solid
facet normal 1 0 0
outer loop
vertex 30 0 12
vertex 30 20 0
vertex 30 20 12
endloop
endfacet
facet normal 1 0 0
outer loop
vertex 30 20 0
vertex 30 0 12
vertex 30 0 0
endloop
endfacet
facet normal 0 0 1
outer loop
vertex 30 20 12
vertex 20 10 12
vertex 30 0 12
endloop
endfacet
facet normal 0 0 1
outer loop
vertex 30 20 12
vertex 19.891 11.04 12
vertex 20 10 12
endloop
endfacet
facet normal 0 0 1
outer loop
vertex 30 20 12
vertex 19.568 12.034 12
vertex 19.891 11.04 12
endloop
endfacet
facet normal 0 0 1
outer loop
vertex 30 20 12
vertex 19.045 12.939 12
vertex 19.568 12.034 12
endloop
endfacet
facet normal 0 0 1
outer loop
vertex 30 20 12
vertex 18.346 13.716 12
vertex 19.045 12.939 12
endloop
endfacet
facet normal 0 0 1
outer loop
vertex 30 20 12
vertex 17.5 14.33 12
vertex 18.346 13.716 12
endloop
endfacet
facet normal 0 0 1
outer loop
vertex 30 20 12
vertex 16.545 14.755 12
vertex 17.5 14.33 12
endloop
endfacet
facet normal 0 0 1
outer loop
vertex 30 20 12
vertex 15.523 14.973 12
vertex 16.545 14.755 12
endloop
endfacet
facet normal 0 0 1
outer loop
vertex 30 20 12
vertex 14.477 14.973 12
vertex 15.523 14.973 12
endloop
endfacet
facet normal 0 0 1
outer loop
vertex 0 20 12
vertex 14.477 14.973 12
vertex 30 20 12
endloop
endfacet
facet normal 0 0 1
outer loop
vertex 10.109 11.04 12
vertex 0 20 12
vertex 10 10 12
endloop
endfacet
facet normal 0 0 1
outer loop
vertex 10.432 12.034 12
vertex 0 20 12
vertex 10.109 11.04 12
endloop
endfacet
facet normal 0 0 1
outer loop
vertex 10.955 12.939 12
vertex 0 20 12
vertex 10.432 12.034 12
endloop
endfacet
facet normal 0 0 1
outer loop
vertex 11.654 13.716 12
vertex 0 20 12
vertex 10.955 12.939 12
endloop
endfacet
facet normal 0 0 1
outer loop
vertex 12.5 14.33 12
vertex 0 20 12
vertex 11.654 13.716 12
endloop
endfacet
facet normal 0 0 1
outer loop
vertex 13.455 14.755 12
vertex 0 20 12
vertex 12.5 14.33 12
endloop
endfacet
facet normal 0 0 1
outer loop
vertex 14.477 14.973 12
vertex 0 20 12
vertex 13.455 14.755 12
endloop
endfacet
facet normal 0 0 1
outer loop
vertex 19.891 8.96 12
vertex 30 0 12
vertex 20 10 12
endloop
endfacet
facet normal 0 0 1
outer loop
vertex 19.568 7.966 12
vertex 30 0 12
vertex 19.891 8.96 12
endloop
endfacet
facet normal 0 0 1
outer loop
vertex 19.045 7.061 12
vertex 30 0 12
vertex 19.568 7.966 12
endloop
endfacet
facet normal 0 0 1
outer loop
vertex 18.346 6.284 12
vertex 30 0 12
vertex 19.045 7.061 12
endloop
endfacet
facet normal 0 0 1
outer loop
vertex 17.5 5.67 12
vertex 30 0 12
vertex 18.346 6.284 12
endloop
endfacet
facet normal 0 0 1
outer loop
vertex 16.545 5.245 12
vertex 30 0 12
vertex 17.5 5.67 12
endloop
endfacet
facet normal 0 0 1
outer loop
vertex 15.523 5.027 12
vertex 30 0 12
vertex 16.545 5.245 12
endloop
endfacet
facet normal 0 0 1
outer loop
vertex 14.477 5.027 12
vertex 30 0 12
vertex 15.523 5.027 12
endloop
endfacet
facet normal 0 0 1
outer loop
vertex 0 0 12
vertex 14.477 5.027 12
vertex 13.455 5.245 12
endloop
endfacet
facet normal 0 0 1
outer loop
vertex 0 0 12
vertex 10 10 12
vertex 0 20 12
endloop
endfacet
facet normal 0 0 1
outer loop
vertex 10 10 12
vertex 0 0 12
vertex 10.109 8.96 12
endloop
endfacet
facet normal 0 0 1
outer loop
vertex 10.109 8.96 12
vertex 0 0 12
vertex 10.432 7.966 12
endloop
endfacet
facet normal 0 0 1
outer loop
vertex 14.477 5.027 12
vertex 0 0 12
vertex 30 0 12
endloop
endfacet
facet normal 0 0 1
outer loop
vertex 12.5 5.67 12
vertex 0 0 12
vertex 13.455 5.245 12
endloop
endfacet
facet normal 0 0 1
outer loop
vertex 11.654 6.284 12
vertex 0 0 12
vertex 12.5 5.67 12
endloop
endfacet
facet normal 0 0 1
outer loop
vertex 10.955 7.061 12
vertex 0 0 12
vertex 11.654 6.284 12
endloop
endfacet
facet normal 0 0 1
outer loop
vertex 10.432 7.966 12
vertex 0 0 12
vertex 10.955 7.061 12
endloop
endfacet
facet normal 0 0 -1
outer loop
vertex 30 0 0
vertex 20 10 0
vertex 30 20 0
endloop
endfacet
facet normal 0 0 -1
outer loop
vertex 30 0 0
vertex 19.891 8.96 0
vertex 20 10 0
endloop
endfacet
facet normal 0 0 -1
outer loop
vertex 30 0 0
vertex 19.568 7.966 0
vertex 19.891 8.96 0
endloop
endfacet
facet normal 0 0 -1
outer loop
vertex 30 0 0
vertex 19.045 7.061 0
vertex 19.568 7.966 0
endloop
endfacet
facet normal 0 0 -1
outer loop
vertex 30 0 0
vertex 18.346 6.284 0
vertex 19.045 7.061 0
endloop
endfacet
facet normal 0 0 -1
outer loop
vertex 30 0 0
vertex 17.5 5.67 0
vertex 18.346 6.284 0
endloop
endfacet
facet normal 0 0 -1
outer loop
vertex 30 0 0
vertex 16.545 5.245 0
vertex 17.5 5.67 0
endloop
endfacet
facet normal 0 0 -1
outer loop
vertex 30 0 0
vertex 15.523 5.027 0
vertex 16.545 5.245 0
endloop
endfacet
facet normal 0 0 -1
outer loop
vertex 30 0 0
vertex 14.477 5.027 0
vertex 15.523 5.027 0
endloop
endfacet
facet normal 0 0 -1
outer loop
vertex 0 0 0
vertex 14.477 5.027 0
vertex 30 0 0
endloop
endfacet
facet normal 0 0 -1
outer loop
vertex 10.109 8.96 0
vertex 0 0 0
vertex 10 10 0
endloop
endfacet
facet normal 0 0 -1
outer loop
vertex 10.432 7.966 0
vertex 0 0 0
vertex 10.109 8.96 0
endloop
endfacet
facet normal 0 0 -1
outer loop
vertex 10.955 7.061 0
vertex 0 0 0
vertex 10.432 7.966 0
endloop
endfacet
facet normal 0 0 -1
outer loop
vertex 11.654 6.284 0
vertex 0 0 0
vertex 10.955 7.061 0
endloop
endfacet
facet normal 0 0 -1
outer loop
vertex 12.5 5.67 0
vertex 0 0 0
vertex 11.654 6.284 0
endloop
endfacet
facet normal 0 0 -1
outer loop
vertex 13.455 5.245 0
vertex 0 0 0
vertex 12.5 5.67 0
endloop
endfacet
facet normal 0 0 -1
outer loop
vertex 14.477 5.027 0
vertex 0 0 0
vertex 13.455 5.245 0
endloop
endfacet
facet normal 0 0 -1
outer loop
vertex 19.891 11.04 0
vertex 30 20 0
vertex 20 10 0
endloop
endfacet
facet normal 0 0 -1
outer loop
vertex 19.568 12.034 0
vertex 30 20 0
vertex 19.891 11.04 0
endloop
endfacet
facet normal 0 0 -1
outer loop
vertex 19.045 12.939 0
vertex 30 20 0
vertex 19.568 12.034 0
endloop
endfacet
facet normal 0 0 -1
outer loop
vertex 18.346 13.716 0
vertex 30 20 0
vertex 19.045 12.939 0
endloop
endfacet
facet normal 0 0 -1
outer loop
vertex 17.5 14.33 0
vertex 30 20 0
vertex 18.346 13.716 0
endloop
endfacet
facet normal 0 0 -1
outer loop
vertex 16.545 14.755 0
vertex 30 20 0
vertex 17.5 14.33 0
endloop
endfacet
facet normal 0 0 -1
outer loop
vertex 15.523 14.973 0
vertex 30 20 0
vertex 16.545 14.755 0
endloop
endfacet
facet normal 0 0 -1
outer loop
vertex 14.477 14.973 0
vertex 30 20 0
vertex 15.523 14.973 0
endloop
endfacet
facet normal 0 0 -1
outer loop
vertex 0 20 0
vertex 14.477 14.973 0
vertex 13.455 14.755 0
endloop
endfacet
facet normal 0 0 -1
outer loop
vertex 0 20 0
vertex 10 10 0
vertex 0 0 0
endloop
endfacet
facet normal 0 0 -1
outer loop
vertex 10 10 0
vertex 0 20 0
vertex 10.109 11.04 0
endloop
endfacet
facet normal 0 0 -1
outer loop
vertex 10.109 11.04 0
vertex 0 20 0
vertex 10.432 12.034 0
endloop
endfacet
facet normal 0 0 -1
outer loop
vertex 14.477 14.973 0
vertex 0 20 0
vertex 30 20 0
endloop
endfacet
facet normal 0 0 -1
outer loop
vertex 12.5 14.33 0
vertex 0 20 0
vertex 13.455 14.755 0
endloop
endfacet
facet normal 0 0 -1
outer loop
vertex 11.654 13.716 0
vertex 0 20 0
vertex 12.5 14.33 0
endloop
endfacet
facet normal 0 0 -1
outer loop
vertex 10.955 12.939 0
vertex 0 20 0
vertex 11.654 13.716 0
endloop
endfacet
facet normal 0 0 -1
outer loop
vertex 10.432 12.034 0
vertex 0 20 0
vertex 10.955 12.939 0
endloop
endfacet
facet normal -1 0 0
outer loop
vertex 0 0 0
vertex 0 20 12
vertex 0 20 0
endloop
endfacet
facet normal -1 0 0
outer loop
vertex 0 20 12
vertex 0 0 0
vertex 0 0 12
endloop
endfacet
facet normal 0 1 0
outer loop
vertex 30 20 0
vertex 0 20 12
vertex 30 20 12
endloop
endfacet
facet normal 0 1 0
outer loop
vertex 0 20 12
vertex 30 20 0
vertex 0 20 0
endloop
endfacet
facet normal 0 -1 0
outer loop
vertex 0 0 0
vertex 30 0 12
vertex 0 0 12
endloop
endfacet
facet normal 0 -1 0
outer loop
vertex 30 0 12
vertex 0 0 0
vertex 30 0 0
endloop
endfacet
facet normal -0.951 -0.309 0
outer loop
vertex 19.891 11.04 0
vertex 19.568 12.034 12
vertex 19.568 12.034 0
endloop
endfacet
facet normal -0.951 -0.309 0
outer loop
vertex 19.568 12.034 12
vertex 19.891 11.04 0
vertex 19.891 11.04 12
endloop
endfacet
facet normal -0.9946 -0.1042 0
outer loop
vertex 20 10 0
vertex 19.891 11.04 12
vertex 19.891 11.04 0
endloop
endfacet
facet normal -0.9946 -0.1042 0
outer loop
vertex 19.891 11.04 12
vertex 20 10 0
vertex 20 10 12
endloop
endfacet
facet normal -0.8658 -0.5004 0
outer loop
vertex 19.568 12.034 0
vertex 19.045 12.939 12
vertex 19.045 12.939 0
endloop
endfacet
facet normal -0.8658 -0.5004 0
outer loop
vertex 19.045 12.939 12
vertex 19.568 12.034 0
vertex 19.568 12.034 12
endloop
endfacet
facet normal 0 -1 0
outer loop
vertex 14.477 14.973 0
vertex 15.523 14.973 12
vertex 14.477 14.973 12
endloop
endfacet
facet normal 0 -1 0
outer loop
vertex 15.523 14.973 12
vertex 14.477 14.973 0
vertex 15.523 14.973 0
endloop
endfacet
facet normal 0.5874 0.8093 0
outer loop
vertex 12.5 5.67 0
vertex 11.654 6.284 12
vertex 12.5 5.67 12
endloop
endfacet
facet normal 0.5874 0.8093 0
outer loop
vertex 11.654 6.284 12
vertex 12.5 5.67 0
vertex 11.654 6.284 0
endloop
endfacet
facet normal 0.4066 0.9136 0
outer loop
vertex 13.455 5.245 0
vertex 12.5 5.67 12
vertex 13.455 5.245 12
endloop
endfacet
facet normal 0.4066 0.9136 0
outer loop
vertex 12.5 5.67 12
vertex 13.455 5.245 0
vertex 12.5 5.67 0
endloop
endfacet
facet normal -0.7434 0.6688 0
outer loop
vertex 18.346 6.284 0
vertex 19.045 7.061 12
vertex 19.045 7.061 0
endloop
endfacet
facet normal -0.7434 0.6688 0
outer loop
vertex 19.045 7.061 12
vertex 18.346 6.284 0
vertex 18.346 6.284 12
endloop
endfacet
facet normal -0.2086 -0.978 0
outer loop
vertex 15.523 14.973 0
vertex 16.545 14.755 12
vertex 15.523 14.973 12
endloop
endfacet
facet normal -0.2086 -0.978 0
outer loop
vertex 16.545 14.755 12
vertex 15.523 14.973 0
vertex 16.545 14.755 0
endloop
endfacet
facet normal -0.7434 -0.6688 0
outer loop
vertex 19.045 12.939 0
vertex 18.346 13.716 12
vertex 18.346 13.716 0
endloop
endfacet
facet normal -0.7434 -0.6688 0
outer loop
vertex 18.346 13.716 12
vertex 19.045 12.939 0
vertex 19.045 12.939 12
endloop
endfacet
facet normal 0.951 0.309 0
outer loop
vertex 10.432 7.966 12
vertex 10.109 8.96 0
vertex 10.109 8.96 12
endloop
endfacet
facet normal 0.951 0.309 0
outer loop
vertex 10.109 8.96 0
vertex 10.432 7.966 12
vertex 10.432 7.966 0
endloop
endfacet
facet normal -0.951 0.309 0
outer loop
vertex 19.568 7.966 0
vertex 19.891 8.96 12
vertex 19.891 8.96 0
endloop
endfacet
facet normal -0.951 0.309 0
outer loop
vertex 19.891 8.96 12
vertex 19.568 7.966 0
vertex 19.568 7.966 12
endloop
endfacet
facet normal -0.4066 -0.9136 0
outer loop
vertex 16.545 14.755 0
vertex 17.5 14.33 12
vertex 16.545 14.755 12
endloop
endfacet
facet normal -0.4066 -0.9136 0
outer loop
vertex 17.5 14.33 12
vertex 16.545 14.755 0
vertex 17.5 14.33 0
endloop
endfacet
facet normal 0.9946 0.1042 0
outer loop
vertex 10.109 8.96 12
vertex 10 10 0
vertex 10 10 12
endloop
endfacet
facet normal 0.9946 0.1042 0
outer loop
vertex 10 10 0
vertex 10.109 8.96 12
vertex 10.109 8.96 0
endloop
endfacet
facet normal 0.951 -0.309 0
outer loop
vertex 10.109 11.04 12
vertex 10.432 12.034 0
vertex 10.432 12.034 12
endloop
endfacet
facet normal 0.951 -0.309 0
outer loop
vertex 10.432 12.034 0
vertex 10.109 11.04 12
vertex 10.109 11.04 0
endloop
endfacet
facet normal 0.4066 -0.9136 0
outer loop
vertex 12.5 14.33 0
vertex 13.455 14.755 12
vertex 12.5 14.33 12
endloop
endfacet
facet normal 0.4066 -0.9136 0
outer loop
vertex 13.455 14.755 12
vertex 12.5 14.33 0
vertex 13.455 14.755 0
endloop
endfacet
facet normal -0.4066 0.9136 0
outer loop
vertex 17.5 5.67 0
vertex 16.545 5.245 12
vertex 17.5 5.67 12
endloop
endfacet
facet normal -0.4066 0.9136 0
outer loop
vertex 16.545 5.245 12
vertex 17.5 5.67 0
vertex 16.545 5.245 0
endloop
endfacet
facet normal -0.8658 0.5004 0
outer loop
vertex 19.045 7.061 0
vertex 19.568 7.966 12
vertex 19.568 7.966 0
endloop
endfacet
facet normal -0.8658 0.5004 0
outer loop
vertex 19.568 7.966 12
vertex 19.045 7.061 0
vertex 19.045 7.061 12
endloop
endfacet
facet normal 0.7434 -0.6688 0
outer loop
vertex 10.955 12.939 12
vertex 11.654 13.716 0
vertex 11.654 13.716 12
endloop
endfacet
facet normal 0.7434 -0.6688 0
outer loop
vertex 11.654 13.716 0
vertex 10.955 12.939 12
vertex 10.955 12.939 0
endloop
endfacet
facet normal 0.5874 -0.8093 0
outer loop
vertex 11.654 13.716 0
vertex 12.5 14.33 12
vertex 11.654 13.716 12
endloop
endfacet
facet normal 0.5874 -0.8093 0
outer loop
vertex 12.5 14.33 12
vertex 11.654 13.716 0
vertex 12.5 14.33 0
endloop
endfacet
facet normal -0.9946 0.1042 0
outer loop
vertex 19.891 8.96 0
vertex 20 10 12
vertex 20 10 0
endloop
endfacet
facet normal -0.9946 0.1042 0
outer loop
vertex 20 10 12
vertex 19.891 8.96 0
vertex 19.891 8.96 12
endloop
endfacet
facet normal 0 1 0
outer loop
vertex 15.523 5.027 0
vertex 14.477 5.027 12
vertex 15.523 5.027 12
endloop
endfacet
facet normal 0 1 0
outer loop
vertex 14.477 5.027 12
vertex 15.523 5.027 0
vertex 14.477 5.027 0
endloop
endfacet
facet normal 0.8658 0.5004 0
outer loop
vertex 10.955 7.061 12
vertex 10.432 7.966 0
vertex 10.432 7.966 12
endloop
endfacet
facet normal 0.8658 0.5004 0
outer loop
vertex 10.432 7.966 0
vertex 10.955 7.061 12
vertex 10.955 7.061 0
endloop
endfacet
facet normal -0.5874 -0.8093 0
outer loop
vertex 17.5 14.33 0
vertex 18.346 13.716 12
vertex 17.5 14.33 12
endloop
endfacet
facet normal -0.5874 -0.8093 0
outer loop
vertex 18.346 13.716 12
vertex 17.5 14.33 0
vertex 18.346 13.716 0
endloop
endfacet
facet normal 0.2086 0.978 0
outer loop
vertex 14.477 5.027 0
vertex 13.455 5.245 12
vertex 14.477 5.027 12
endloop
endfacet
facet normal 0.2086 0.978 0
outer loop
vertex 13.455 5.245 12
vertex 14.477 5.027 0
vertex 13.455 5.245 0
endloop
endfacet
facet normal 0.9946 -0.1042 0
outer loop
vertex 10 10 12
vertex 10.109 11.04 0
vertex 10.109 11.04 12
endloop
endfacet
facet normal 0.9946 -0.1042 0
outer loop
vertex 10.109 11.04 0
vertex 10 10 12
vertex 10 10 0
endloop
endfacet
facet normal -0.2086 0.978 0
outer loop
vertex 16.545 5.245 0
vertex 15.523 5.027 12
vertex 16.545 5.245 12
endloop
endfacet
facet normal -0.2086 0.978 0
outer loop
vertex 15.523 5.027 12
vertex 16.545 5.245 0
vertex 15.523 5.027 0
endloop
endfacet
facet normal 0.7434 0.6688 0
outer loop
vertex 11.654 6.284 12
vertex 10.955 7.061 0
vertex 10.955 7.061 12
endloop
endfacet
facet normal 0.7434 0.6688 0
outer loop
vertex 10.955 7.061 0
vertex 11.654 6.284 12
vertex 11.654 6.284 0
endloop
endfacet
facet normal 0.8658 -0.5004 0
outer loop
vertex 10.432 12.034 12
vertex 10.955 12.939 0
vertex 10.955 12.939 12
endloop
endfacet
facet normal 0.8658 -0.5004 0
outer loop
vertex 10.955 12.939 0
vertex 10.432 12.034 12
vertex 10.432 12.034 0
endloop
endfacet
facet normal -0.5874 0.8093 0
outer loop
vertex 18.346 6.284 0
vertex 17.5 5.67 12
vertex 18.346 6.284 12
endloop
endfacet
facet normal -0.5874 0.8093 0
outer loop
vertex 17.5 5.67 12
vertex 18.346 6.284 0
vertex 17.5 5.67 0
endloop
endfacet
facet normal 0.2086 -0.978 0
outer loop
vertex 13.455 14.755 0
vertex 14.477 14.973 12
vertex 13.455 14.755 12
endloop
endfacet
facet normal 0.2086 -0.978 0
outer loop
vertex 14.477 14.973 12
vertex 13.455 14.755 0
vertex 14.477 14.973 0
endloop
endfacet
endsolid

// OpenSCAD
difference() {
  cube([30, 20, 12]);
  translate([15, 10, -1])   // 살짝 더 아래에서 시작
    cylinder(h=14, r=5, $fn=30);  // 높이도 12보다 여유 있게!
}

// 큐브 높이(12)보다 조금 더 길게(14) 여유를 주면
// 확실하게 완전히 뚫려요 — 이 여유를 tolerance(공차)라고 해요
